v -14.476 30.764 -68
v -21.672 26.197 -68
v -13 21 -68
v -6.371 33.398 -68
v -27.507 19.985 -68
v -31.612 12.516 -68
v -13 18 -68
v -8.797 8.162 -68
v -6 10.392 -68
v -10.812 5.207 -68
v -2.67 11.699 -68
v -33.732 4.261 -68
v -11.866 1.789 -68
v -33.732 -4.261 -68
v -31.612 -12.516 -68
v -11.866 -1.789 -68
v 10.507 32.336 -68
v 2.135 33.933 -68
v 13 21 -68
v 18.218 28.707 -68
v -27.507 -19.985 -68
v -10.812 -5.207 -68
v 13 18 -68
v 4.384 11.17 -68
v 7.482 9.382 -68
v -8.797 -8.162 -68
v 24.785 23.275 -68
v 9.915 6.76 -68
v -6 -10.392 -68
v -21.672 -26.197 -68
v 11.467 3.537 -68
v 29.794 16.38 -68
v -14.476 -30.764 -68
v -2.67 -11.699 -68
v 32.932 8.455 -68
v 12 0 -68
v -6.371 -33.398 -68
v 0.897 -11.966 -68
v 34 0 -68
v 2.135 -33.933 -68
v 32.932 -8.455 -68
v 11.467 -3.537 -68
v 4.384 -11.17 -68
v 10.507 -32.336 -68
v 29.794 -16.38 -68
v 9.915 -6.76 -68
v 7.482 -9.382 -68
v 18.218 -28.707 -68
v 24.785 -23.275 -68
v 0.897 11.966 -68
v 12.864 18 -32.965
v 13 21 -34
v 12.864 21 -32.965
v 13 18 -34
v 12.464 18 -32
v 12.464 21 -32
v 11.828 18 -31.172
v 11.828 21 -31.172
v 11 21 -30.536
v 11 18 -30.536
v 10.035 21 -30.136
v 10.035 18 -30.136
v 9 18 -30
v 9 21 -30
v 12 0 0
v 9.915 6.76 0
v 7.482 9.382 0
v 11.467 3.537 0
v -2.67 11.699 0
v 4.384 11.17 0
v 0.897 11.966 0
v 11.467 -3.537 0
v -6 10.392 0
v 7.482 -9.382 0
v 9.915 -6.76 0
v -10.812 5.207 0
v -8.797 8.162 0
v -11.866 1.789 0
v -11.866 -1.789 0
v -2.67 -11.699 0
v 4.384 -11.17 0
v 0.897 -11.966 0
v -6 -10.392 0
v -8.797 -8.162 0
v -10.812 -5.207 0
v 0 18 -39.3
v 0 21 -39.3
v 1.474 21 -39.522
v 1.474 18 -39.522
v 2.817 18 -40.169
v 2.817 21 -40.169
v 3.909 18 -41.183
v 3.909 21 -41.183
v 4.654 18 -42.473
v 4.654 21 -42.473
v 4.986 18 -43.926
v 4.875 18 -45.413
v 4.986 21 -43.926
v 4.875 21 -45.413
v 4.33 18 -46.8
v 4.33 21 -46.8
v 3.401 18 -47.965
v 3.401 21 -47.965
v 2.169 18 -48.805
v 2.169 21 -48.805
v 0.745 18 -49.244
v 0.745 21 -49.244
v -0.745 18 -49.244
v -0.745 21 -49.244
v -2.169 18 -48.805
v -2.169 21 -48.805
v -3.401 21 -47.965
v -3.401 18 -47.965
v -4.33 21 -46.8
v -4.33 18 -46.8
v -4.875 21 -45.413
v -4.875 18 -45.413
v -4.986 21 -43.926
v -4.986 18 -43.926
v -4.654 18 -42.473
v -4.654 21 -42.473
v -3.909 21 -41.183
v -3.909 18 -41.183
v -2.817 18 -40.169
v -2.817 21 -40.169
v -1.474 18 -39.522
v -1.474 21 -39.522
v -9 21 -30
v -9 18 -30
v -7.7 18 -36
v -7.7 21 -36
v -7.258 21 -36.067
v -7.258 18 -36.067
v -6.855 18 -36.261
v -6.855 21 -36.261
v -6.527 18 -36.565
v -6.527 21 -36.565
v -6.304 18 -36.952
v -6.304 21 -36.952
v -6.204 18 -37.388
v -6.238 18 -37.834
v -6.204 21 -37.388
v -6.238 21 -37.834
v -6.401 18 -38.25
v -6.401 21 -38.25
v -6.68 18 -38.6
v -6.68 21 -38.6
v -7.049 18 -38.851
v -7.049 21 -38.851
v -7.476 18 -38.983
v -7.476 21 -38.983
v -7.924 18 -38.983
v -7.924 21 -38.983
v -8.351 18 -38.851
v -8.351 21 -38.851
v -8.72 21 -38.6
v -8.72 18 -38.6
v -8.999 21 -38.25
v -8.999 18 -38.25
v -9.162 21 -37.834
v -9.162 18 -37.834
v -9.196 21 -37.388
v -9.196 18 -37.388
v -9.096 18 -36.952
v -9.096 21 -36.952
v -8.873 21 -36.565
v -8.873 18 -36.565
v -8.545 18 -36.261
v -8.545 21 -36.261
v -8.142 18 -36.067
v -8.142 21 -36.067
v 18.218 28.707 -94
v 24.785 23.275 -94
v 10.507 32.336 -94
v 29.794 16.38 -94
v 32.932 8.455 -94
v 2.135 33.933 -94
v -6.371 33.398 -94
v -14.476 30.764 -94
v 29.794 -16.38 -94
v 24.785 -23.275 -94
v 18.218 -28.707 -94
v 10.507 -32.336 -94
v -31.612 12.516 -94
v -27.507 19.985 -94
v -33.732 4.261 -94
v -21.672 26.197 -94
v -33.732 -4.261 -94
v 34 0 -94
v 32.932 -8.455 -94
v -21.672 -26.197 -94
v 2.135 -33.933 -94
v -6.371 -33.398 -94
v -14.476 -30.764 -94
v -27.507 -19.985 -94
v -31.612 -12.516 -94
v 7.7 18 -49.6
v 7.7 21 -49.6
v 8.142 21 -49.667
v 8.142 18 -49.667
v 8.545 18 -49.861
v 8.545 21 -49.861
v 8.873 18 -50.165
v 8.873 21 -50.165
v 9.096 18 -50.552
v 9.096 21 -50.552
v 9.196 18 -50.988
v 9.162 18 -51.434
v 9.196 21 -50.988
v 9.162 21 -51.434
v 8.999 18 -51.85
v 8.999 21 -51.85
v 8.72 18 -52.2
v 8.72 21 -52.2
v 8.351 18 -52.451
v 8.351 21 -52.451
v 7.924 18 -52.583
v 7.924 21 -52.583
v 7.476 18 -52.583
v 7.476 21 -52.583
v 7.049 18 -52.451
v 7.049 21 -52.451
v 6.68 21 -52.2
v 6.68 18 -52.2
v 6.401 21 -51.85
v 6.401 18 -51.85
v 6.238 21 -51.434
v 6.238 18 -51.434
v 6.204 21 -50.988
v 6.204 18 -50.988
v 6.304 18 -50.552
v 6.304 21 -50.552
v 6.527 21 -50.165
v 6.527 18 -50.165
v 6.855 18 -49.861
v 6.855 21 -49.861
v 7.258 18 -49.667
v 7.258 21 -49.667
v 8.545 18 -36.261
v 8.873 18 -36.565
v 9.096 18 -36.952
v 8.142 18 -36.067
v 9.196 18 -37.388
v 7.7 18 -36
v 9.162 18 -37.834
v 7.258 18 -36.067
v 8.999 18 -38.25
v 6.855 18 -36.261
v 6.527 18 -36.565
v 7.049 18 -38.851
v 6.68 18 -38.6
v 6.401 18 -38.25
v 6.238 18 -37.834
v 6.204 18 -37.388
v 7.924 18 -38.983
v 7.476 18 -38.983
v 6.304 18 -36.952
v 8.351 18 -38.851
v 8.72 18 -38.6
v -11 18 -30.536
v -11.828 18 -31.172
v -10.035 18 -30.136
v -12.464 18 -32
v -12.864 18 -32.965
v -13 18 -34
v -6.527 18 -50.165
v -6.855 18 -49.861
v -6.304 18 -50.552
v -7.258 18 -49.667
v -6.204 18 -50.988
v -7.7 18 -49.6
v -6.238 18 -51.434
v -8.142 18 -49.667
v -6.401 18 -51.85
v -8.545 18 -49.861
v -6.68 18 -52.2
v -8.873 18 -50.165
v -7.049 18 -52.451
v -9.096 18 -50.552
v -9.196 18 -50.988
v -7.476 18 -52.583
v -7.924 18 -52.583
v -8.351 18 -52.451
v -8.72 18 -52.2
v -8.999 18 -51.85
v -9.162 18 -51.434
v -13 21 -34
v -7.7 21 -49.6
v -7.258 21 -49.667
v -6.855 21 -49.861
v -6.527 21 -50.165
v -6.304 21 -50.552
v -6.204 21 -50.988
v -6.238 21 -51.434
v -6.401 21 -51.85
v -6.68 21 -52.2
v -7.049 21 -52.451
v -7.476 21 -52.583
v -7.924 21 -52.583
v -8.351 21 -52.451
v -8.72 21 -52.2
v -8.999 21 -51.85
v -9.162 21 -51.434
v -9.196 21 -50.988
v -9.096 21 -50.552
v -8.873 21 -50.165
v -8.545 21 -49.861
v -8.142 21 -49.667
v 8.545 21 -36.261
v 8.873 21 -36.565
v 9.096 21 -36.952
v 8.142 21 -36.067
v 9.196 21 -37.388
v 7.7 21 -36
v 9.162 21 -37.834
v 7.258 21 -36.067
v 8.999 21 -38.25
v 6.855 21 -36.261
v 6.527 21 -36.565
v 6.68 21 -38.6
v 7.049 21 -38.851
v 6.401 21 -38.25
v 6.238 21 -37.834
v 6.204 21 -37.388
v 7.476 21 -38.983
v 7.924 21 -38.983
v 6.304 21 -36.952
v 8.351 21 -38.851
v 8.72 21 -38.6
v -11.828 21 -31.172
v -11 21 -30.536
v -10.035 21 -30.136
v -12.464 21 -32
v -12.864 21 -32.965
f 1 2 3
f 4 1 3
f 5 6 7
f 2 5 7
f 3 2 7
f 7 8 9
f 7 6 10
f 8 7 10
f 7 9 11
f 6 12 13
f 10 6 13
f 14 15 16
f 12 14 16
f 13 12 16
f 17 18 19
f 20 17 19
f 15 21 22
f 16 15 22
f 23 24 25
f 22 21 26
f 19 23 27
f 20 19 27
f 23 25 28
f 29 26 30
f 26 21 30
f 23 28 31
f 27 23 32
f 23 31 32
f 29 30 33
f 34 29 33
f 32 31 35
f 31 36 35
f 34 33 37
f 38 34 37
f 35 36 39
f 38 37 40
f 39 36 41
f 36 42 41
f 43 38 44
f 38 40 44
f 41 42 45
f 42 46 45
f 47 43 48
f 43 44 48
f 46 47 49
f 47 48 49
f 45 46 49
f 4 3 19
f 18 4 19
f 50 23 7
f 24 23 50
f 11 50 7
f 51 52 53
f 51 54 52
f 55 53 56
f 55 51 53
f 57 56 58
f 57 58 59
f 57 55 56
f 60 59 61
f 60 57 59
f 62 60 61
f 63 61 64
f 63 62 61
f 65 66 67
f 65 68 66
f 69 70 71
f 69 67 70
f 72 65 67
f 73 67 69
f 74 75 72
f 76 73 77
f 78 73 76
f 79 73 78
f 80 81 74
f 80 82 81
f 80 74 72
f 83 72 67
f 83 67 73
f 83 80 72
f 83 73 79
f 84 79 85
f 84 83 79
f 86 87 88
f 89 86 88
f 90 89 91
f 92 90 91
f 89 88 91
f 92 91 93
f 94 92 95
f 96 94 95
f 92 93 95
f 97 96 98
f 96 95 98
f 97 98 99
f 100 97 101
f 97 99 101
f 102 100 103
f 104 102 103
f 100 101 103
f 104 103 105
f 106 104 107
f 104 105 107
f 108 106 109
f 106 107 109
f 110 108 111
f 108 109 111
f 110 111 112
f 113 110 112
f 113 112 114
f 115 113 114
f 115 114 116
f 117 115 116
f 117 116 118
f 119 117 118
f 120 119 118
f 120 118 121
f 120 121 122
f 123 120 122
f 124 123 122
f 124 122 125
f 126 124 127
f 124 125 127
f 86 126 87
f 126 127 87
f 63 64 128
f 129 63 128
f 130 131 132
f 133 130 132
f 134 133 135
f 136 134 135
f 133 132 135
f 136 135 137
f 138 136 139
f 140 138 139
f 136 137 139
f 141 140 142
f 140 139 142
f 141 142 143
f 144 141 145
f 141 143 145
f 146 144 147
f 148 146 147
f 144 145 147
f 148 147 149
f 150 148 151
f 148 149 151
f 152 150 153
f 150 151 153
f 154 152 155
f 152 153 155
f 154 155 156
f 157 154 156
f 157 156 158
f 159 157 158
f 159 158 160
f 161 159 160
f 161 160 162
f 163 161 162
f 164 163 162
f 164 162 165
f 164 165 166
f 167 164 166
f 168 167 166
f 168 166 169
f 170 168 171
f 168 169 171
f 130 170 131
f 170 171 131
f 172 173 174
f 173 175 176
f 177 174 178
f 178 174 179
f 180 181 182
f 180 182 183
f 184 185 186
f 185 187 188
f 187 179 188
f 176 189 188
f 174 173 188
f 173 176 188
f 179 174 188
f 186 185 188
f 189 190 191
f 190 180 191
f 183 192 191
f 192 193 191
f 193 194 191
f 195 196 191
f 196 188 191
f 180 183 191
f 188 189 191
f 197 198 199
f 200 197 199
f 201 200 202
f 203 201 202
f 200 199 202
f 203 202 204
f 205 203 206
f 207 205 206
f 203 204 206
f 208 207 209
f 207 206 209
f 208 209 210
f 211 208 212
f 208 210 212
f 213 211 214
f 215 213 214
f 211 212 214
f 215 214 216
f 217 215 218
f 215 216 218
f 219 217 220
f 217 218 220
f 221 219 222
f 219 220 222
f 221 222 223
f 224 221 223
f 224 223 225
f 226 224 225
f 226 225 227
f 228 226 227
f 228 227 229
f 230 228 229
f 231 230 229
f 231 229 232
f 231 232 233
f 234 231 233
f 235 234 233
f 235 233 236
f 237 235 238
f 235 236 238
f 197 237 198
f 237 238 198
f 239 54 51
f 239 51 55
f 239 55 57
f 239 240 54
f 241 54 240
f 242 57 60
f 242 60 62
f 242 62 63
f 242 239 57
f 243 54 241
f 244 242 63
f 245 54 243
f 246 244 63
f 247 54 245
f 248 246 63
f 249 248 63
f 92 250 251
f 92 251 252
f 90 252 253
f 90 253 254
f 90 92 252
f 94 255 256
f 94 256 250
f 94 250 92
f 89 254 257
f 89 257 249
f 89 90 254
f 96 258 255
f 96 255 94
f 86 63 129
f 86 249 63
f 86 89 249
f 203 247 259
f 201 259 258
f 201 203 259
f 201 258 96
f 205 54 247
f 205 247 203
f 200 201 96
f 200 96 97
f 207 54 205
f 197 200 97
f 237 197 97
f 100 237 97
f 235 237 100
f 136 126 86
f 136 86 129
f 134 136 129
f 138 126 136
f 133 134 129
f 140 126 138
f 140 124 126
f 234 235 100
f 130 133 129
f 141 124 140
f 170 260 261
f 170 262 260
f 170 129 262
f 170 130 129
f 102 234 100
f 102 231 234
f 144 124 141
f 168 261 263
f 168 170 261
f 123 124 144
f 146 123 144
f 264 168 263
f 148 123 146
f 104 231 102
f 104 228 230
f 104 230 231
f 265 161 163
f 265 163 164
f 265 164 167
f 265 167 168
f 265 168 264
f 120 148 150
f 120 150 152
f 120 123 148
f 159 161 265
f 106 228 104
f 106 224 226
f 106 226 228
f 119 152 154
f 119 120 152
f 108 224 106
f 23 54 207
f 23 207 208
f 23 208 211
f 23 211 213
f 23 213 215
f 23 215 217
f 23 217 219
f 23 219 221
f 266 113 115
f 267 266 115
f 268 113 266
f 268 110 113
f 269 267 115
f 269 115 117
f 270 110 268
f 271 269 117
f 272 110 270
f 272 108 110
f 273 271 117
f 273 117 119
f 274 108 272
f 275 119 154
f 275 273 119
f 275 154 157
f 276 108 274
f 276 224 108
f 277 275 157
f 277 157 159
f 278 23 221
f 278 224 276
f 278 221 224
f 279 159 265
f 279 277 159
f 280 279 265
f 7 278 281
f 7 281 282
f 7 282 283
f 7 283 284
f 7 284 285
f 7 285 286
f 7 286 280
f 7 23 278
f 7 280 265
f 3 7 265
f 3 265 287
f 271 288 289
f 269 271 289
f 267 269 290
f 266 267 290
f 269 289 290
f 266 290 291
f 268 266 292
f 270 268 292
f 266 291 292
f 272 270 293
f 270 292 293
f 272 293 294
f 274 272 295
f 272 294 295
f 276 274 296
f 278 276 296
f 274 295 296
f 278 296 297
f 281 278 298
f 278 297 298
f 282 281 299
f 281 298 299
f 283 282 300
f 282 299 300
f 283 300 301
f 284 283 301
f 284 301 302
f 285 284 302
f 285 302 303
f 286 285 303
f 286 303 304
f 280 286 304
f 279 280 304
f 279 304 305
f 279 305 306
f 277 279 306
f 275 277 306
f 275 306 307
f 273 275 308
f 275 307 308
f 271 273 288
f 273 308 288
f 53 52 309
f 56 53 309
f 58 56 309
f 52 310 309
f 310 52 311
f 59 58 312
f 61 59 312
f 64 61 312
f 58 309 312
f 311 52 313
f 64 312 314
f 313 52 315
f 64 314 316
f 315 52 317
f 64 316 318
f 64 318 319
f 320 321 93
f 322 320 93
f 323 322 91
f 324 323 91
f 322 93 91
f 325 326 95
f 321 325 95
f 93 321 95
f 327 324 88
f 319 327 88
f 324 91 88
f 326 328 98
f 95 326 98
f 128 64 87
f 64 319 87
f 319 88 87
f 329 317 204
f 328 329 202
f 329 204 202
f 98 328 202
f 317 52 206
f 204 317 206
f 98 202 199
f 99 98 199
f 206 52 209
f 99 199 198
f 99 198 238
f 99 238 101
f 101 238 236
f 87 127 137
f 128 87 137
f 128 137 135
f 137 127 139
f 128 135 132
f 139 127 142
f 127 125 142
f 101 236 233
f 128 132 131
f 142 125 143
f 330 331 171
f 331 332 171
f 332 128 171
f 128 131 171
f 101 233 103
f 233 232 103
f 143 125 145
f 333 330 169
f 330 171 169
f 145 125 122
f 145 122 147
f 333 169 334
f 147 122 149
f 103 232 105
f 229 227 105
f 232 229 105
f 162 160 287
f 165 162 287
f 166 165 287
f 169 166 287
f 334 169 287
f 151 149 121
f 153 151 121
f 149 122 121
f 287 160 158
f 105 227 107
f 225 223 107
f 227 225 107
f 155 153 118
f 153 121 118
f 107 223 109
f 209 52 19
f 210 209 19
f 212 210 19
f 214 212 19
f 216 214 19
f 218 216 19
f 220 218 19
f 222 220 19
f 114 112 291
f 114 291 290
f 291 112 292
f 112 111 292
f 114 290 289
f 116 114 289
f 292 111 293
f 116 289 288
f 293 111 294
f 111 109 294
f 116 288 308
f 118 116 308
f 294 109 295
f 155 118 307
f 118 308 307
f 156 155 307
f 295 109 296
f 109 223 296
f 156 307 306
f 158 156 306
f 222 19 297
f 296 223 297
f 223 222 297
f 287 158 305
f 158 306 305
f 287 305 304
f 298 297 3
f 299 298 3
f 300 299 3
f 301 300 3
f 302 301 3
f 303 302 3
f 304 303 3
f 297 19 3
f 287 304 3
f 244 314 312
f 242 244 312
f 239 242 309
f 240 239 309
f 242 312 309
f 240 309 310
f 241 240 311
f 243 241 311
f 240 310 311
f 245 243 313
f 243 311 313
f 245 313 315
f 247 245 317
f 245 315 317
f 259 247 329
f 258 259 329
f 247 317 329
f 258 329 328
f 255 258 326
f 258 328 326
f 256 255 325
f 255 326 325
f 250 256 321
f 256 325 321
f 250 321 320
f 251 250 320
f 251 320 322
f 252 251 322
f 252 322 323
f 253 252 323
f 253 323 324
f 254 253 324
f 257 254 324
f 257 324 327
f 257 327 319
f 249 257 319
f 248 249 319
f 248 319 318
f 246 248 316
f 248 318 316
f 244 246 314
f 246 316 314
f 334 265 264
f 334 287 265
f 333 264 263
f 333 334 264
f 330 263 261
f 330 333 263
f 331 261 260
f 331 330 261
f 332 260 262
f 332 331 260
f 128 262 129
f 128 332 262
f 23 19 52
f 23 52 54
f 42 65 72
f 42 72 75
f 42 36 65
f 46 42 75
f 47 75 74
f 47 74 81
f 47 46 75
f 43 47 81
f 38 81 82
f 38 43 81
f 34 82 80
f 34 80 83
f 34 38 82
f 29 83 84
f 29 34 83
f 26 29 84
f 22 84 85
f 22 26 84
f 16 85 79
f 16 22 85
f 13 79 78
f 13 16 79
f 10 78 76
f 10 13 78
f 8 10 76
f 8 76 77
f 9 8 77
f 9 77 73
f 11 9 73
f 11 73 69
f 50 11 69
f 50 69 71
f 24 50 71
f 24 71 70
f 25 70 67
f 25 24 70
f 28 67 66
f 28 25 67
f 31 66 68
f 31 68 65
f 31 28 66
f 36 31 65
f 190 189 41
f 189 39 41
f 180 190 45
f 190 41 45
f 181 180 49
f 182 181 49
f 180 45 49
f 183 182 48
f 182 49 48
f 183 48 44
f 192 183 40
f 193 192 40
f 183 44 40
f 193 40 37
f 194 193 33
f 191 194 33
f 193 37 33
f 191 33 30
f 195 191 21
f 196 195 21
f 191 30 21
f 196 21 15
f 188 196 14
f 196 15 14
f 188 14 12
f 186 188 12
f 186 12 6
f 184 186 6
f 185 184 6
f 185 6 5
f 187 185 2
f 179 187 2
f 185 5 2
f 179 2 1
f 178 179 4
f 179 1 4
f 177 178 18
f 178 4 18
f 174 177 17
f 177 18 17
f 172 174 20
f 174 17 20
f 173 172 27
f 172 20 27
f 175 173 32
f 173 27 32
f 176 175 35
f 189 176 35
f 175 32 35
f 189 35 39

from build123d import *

# Parameters (mm, degrees)
SKETCH_1_W          = 68
SKETCH_1_H          = 12
EXTRUDE_1_DEPTH     = 38
SKETCH_3_R          = 1.5
SKETCH_3_R_2        = 5
CUT_EXTRUDE_1_DEPTH = 3
FILLET_1_R          = 4


with BuildPart() as part:
    # Эскиз1 → Повернуть1 (revolve)
    with BuildSketch(Plane(origin=(0, 0, 0), x_dir=(0, 0, -1), z_dir=(1, 0, 0)), mode=Mode.PRIVATE) as revolve_1_sk:
        with Locations((34, 6)):
            Rectangle(SKETCH_1_W, SKETCH_1_H)
        Polygon((68, 12), (68, 0), (94, 0), (94, 34), (68, 34), align=None)
    revolve(revolve_1_sk.sketch.rotate(Axis((0, 0, 0), (0, 0, -1)), 90), axis=Axis((0, 0, 0), (0, 0, -1)))

    # Эскиз2 → Бобышка-Вытянуть1 (add)
    with BuildSketch(Plane.XY.offset(-68)):
        Polygon((0, 21), (13, 21), (13, 18), (-13, 18), (-13, 21), align=None)
    extrude(amount=EXTRUDE_1_DEPTH)

    # Эскиз3 → Вырез-Вытянуть1 (cut)
    with BuildSketch(Plane(origin=(0, 21, 0), x_dir=(1, 0, 0), z_dir=(0, 1, 0))):
        with Locations(Location((-7.7, 51.1, 0), (0, 0, 270))):
            Circle(SKETCH_3_R)
        with Locations(Location((7.7, 51.1, 0), (0, 0, 270))):
            Circle(SKETCH_3_R)
        with Locations(Location((7.7, 37.5, 0), (0, 0, 270))):
            Circle(SKETCH_3_R)
        with Locations(Location((-7.7, 37.5, 0), (0, 0, 270))):
            Circle(SKETCH_3_R)
        with Locations(Location((0, 44.3, 0), (0, 0, 270))):
            Circle(SKETCH_3_R_2)
    extrude(amount=-CUT_EXTRUDE_1_DEPTH, mode=Mode.SUBTRACT)

    # Скругление1
    fillet_1_edges = [part.edges().sort_by_distance(p)[0] for p in [
        (-13, 19.5, -30),
        (13, 19.5, -30),
    ]]
    fillet(fillet_1_edges, radius=FILLET_1_R)


solid = part.part
